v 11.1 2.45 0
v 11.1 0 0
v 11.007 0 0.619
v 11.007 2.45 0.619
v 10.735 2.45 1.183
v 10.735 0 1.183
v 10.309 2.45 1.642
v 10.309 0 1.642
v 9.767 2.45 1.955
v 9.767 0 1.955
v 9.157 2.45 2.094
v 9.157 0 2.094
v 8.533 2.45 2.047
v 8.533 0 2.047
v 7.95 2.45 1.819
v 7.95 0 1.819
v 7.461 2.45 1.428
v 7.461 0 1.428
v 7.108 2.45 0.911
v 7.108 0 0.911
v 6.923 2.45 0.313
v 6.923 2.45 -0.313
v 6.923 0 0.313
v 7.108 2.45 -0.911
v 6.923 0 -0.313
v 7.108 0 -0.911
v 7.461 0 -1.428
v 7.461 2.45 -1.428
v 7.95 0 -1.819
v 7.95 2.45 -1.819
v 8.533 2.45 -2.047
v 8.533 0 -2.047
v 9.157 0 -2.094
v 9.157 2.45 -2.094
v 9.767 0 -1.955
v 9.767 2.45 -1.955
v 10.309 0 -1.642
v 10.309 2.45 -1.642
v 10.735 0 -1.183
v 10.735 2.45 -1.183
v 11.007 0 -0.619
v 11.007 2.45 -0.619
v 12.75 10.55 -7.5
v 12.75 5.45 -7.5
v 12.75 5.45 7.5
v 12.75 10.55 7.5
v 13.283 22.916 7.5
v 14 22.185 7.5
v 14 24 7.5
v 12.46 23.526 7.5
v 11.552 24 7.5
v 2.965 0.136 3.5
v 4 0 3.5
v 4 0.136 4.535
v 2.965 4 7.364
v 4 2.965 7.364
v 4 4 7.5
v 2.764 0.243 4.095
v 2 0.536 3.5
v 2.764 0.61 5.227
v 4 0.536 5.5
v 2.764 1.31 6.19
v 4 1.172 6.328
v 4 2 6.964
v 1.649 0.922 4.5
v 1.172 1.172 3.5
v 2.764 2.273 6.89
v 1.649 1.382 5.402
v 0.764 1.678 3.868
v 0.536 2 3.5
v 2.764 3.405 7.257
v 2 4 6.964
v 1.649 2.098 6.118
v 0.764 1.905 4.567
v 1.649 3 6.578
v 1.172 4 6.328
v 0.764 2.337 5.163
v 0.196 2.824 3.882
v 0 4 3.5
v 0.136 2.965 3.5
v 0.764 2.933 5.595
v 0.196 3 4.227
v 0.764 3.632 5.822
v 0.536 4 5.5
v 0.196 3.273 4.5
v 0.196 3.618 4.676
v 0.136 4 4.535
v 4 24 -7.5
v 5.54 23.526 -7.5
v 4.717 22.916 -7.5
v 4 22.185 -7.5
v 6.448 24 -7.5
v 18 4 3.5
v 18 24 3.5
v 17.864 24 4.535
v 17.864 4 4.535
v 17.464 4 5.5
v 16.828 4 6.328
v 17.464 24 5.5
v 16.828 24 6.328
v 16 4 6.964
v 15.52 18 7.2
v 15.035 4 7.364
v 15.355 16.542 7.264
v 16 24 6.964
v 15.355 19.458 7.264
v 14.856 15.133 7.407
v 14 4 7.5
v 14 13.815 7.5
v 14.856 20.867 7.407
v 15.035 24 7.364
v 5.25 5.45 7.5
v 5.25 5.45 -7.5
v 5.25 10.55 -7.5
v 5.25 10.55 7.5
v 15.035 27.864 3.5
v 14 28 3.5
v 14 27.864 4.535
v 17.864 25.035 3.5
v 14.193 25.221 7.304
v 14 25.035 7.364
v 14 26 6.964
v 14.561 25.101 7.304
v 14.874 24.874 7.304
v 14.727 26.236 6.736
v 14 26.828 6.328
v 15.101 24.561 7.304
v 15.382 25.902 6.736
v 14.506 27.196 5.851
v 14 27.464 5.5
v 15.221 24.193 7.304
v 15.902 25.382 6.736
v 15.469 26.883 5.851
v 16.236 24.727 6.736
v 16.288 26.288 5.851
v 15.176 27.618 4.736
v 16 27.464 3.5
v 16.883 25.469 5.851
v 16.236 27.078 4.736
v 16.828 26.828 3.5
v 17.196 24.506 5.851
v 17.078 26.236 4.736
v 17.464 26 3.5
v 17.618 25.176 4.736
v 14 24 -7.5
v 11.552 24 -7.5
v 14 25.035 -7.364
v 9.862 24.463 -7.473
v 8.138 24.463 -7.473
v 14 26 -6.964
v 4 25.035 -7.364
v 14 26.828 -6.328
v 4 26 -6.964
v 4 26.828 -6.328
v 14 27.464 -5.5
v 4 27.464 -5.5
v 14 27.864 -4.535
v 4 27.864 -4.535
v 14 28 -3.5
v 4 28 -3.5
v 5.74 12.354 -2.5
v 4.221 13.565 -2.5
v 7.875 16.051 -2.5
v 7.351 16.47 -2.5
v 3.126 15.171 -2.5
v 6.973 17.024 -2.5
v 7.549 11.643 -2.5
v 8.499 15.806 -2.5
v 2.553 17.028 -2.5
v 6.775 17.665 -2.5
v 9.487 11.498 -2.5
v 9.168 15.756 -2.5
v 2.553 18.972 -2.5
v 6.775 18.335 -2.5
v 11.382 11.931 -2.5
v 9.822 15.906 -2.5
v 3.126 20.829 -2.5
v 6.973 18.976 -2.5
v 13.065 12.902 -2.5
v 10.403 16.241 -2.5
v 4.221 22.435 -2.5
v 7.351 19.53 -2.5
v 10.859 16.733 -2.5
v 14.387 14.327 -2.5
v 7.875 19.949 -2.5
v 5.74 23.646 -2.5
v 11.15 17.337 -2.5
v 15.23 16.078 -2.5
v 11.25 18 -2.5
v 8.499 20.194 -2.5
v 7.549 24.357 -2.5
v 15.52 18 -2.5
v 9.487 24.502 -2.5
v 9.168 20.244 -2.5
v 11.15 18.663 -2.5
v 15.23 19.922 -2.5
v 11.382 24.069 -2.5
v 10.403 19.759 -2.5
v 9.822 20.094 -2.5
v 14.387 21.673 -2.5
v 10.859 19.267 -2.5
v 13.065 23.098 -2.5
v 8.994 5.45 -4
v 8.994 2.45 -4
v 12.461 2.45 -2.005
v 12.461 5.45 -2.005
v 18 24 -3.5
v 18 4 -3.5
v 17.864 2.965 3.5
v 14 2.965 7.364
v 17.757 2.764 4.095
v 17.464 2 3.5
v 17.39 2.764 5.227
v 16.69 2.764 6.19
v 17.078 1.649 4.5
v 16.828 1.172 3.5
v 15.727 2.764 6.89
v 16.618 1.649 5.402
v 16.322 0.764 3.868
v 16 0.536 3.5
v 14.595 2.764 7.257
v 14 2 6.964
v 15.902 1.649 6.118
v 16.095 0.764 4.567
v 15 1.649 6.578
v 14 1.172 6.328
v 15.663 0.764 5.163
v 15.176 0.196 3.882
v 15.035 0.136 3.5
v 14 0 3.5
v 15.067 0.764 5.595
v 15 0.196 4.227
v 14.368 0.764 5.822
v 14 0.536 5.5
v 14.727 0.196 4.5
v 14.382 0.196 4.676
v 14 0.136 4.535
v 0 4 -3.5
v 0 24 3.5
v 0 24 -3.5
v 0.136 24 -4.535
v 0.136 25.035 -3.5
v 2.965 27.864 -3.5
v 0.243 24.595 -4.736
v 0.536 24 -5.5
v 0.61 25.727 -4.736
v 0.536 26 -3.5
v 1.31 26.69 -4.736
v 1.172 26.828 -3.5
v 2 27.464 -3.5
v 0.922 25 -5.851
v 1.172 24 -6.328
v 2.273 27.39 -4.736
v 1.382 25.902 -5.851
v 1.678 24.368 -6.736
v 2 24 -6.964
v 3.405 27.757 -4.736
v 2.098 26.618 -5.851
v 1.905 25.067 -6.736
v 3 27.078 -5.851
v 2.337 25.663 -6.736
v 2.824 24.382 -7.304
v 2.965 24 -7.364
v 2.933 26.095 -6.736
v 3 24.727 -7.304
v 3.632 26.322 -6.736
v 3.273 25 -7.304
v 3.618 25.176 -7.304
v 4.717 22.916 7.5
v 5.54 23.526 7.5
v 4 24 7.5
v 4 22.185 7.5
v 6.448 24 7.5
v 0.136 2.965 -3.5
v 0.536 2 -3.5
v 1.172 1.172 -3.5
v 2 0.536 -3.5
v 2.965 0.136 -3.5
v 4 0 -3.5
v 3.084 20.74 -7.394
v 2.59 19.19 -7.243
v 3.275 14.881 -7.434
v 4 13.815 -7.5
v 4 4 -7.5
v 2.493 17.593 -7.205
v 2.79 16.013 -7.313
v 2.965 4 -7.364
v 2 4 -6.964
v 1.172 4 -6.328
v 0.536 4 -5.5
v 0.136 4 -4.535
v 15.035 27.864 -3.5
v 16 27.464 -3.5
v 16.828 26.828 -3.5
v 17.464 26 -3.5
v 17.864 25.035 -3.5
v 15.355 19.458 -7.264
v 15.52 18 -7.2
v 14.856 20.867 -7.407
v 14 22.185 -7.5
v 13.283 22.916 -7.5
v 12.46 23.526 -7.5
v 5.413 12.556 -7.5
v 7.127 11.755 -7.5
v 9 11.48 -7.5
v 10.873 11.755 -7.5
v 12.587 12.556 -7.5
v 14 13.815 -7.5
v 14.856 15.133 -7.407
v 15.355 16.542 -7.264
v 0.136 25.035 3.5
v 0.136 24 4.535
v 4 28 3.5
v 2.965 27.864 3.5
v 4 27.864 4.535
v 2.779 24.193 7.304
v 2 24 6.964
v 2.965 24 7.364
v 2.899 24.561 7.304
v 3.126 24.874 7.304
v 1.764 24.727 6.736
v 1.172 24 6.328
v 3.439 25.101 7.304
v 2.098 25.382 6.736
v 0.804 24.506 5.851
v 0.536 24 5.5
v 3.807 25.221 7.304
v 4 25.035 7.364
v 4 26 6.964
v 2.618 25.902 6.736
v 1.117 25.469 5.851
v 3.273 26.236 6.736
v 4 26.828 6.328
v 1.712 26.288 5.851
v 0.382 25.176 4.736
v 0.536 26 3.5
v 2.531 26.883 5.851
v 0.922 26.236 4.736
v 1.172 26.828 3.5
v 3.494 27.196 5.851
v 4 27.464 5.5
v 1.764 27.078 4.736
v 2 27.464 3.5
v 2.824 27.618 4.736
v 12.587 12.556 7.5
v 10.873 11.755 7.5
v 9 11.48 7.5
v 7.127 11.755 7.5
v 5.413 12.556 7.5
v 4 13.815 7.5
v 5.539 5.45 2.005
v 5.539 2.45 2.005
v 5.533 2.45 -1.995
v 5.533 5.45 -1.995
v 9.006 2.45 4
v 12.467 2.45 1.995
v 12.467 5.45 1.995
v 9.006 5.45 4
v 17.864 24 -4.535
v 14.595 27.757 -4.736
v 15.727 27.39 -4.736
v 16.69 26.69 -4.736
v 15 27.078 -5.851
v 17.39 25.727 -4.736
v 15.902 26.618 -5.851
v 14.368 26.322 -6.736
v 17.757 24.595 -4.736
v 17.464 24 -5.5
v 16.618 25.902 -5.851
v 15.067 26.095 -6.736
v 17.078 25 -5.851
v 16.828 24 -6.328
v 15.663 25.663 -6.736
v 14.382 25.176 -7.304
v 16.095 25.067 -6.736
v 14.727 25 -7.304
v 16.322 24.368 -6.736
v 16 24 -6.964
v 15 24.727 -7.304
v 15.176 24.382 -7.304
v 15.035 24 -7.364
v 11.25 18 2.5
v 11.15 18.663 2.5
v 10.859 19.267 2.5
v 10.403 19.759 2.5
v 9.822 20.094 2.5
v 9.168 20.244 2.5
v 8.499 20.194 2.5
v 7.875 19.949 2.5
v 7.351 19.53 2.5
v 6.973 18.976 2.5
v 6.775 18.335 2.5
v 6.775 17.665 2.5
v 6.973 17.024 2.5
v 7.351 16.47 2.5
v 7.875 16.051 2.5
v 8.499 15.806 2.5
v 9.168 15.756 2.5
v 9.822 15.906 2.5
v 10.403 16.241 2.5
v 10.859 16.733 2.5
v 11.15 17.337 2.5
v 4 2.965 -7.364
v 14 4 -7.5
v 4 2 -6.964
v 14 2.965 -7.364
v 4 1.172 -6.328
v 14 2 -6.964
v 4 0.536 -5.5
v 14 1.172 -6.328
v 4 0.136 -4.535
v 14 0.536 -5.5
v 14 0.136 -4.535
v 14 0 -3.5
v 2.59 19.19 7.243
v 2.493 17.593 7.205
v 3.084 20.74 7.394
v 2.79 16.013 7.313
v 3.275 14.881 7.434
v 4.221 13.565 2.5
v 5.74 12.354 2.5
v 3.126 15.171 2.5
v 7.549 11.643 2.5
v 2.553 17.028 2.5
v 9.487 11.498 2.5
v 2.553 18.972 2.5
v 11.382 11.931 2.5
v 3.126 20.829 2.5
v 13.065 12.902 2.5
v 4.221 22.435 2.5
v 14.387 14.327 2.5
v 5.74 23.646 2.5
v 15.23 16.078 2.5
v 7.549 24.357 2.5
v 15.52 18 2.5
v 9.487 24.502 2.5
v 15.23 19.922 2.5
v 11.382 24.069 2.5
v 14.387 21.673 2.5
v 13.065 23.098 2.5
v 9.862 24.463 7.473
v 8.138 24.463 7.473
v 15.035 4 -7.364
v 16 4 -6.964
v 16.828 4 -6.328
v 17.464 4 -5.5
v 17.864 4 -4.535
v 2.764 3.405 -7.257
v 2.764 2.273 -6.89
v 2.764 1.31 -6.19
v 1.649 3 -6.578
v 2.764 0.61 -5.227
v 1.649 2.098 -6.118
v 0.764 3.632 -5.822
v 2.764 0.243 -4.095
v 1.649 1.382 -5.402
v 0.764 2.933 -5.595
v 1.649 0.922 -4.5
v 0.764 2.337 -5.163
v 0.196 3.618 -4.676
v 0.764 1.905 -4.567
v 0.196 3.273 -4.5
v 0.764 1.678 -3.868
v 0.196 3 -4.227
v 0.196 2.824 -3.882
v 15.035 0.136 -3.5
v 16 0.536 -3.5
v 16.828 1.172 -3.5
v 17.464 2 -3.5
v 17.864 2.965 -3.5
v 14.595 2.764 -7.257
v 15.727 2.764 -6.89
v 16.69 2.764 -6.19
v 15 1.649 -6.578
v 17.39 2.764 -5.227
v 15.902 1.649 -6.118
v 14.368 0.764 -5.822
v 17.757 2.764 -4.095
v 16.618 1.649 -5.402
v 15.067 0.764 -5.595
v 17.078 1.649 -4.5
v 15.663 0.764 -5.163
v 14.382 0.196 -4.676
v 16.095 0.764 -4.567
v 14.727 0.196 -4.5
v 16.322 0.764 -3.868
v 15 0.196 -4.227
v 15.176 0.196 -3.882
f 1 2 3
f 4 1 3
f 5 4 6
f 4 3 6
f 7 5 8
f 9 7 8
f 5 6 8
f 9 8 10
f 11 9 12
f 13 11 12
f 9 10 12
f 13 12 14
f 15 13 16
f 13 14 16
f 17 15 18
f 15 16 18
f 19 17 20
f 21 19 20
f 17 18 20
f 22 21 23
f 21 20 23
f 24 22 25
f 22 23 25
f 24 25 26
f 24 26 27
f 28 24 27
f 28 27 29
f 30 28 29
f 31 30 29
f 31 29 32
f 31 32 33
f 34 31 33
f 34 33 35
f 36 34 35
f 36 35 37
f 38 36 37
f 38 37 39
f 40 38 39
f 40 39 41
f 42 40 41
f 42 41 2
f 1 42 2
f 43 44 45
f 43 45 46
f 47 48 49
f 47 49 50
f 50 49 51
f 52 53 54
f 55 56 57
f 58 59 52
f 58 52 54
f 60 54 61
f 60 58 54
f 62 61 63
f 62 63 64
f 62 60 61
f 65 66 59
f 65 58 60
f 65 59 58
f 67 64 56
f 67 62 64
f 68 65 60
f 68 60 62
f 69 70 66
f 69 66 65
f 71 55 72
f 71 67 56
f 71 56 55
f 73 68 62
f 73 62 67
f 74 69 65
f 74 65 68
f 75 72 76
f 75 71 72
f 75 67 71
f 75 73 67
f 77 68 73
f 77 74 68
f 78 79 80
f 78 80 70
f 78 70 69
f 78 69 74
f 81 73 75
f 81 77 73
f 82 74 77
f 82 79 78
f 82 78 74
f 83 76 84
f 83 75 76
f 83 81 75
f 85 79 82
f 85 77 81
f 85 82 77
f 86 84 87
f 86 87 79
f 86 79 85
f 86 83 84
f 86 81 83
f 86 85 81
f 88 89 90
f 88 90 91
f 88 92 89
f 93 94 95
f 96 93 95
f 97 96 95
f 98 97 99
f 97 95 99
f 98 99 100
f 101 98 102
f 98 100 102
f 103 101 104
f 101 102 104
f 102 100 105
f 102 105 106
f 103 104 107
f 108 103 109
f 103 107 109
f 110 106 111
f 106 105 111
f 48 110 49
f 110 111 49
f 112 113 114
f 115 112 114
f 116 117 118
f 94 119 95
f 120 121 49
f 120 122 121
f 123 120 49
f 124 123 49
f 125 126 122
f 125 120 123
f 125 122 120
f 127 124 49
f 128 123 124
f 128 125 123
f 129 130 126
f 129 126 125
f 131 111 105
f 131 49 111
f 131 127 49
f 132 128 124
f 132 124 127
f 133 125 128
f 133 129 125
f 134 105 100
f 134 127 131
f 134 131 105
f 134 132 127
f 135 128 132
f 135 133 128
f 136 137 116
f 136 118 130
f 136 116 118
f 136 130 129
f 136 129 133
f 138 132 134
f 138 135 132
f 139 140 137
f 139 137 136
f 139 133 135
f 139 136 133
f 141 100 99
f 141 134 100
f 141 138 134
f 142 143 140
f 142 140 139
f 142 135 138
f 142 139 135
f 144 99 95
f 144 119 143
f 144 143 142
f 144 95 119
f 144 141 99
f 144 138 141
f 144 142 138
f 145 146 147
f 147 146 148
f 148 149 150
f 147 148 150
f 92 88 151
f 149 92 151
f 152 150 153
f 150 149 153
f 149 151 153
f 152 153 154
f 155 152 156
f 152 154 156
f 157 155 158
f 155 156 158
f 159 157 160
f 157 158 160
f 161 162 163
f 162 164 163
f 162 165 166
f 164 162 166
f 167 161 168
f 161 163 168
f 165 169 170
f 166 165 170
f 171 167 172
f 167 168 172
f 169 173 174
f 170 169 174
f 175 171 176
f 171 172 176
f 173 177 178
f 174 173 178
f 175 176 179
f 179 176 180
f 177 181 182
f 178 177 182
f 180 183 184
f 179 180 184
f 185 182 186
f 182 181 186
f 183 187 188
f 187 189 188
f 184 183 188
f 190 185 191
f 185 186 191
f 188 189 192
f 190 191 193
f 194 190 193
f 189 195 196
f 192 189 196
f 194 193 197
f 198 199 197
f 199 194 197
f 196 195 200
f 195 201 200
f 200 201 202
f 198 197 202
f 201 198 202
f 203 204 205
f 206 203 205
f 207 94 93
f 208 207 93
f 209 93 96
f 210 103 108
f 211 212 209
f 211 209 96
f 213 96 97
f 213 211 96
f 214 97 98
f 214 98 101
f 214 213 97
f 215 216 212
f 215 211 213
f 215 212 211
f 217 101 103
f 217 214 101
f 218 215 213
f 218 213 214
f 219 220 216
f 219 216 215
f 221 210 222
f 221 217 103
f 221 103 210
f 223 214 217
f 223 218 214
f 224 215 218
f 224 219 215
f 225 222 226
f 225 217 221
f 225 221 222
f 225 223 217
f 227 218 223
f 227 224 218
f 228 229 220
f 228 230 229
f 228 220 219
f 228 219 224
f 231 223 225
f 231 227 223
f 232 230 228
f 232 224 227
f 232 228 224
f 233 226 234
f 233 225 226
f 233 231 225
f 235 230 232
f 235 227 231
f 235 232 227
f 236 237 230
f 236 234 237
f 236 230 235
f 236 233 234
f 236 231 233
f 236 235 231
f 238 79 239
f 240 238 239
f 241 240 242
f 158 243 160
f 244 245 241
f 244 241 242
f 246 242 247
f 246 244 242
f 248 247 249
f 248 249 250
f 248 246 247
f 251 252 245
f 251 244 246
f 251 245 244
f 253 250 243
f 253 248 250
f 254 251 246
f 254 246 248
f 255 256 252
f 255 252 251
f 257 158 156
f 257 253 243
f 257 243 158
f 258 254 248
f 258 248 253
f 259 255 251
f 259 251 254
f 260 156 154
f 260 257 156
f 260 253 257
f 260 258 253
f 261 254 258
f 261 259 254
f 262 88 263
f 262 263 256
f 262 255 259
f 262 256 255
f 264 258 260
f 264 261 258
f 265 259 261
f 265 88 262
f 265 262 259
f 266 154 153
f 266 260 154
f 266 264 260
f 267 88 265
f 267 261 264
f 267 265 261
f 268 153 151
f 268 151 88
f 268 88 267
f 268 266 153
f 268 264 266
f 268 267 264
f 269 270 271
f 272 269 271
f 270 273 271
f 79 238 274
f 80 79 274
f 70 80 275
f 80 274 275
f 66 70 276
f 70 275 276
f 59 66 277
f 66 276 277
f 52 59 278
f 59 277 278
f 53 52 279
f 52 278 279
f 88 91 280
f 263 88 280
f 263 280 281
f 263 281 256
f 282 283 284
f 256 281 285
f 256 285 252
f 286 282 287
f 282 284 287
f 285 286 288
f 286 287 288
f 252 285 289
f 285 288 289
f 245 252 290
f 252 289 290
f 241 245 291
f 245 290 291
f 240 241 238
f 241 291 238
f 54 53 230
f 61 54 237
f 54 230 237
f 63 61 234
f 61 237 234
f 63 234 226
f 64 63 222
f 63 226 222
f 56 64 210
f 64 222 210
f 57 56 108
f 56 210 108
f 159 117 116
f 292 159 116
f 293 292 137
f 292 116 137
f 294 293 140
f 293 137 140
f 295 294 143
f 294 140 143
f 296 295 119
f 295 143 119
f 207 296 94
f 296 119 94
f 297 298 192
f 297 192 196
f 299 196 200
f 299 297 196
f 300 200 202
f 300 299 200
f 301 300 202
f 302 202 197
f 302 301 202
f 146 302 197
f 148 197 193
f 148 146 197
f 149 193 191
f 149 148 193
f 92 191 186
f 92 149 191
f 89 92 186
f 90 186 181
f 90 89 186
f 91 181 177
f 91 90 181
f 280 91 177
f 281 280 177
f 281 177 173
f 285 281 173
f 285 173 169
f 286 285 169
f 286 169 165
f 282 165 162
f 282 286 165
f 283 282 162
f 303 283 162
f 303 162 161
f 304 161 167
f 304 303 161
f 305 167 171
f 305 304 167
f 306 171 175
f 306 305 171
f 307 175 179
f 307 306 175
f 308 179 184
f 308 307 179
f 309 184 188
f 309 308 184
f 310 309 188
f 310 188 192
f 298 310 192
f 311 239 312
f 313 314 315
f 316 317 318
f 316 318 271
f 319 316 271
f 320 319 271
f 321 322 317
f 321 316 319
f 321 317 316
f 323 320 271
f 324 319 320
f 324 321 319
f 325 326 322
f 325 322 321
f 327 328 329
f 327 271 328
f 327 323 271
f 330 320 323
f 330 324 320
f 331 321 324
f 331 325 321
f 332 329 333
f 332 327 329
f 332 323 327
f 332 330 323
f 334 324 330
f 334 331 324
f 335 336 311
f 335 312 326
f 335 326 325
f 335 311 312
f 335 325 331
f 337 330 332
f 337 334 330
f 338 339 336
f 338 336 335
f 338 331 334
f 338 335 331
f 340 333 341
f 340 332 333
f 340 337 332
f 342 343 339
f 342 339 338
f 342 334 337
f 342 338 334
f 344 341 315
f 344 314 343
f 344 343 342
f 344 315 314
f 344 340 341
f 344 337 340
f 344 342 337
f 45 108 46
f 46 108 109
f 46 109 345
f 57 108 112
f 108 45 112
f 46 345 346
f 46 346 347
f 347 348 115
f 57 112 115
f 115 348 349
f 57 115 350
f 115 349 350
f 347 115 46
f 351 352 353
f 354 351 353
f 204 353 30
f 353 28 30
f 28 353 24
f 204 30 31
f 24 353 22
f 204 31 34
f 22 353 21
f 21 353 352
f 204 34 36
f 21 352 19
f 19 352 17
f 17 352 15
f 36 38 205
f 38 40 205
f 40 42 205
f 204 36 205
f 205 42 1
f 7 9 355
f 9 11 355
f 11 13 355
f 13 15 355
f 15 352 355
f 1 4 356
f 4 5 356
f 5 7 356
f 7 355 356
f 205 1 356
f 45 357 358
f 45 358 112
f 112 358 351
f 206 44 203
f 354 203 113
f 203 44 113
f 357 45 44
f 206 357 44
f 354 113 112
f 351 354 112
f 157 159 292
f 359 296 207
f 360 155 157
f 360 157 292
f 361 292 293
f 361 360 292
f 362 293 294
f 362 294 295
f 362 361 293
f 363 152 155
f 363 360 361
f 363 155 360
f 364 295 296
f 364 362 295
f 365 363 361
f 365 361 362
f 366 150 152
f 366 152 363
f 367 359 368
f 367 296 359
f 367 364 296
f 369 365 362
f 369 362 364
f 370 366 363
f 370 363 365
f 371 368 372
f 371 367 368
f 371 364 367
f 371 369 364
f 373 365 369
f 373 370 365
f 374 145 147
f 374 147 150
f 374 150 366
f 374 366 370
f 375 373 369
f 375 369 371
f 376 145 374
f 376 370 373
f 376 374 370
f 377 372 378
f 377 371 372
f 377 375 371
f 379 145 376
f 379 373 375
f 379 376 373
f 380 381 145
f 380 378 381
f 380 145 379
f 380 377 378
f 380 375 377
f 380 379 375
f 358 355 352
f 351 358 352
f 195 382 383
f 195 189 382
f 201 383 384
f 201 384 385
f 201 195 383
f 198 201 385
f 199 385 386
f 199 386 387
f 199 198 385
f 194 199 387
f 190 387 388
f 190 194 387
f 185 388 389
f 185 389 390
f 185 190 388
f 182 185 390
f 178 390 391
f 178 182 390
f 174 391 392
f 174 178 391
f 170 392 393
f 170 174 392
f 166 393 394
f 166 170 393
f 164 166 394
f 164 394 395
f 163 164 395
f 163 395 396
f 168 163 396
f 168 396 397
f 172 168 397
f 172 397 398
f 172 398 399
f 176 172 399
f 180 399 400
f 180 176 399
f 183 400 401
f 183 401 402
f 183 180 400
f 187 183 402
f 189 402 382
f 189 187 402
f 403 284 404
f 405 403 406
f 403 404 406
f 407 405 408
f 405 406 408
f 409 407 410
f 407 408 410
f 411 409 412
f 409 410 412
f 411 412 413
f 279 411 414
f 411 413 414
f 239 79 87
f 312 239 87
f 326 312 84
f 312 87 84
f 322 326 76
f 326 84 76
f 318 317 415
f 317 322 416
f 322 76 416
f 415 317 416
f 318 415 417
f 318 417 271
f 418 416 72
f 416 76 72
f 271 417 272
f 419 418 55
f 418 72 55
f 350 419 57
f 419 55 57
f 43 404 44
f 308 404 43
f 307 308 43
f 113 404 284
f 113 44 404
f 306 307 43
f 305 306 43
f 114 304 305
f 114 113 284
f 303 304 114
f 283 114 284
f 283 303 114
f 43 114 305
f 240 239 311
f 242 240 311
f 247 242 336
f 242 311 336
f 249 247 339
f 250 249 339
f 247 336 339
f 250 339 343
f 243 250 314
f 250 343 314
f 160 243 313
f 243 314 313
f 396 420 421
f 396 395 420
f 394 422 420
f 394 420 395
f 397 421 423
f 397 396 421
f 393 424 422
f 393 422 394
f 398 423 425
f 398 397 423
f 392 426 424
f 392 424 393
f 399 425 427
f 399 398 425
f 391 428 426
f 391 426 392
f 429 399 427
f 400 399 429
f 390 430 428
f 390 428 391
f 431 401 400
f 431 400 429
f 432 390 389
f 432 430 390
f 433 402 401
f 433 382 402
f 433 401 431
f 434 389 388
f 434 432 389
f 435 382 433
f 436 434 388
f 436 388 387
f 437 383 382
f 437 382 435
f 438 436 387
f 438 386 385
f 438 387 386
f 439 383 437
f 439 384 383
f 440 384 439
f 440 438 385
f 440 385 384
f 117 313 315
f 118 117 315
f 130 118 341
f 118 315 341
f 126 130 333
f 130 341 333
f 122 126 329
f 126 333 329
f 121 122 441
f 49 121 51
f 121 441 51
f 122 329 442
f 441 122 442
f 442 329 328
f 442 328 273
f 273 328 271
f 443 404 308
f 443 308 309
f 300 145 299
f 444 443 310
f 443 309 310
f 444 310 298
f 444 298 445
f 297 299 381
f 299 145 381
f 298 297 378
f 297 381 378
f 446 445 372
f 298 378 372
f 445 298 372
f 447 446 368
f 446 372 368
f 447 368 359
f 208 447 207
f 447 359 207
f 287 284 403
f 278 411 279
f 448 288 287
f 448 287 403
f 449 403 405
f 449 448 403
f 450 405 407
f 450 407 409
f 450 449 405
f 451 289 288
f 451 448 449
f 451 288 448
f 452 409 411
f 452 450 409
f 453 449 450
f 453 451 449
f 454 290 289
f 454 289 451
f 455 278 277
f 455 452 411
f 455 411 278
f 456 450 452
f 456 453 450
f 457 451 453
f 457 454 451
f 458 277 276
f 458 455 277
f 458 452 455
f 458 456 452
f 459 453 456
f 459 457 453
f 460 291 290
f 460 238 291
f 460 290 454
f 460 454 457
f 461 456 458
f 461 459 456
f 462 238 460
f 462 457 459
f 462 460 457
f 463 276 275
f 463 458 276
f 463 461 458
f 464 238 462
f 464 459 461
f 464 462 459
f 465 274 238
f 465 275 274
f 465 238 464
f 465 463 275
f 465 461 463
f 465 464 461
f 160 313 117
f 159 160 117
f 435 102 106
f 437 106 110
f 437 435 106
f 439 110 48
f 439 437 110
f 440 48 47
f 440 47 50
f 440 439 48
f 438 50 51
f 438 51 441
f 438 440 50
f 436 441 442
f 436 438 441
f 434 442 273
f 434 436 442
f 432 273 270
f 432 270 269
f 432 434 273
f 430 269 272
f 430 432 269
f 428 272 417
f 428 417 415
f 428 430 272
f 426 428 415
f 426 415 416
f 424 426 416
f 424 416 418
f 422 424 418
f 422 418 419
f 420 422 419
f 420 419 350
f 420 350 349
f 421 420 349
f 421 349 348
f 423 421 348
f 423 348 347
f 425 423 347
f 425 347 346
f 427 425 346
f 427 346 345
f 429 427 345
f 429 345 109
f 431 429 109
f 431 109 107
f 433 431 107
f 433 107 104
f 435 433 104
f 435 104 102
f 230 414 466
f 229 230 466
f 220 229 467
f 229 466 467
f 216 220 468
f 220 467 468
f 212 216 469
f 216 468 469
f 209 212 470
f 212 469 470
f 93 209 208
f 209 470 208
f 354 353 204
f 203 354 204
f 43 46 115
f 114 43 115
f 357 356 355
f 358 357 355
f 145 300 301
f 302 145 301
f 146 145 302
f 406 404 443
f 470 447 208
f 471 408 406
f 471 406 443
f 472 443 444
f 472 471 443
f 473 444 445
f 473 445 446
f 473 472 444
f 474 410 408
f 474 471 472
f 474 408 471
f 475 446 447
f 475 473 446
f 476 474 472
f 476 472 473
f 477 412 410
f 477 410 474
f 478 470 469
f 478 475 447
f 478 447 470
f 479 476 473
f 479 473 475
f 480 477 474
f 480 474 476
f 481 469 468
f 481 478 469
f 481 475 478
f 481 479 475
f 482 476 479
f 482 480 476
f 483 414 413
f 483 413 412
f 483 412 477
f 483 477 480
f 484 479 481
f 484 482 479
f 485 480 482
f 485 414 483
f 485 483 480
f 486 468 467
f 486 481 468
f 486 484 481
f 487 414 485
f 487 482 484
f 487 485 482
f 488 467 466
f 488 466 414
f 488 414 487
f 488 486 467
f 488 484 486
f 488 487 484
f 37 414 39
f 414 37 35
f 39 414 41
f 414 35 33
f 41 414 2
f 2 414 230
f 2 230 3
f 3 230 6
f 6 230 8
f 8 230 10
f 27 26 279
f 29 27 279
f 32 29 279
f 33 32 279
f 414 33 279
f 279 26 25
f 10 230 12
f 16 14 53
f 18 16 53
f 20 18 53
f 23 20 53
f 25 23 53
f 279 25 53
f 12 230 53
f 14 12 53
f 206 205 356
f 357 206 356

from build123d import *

# Parameters (mm, degrees)
SKETCH1_R           = 2.25
BOSS_EXTRUDE1_DEPTH = 7.5
CUT_EXTRUDE1_START  = -7.5
SKETCH1_3_R         = 6.52
SKETCH1_3_R_2       = 2.25
CUT_EXTRUDE1_DEPTH  = 5
CUT_EXTRUDE2_START  = 2.5
SKETCH1_4_R         = 6.52
SKETCH1_4_R_2       = 2.25
CUT_EXTRUDE2_DEPTH  = 5
FILLET1_R           = 4
SKETCH2_R           = 2.1
CUT_EXTRUDE3_DEPTH  = 10
SKETCH3_W           = 7.5
SKETCH3_H           = 5.1
CUT_EXTRUDE4_DEPTH  = 37.510272694
CUT_EXTRUDE5_START  = -2.45
SKETCH2_7_R         = 2.1
CUT_EXTRUDE5_DEPTH  = 3


with BuildPart() as part:
    # Sketch1 → Boss-Extrude1 (new, symmetric)
    with BuildSketch(Plane.XY):
        with BuildLine():
            Line((0, 0), (0, 24))
            ThreePointArc((0, 24), (1.171572875, 26.828427125), (4, 28))
            Line((4, 28), (14, 28))
            ThreePointArc((14, 28), (16.828427125, 26.828427125), (18, 24))
            Line((18, 24), (18, 0))
            Line((18, 0), (0, 0))
        make_face()
        with Locations((9, 18)):
            Circle(SKETCH1_R, mode=Mode.SUBTRACT)
    extrude(amount=BOSS_EXTRUDE1_DEPTH, both=True)

    # Sketch1<3> → Cut-Extrude1 (cut)
    with BuildSketch(Plane.XY.offset(CUT_EXTRUDE1_START)):
        with Locations((9, 18)):
            Circle(SKETCH1_3_R)
        with Locations((9, 18)):
            Circle(SKETCH1_3_R_2, mode=Mode.SUBTRACT)
    extrude(amount=CUT_EXTRUDE1_DEPTH, mode=Mode.SUBTRACT)

    # Sketch1<4> → Cut-Extrude2 (cut)
    with BuildSketch(Plane.XY.offset(CUT_EXTRUDE2_START)):
        with Locations((9, 18)):
            Circle(SKETCH1_4_R)
        with Locations((9, 18)):
            Circle(SKETCH1_4_R_2, mode=Mode.SUBTRACT)
    extrude(amount=CUT_EXTRUDE2_DEPTH, mode=Mode.SUBTRACT)

    # Fillet1
    # the kernel refuses this fillet: 4 mm, written as the material it takes off along each edge
    with BuildSketch(Plane(origin=(4, 4, -3.5), x_dir=(0, -1, 0), z_dir=(-1, 0, 0))) as fillet1_piece_1_section:
        Polygon((0, 0), (FILLET1_R, 0), (FILLET1_R, -FILLET1_R), (0, -FILLET1_R), align=None)
    fillet1_piece_1 = extrude(amount=FILLET1_R, mode=Mode.PRIVATE)
    fillet1_piece_1 = fillet1_piece_1 - Plane(origin=(4, 4, -3.5), x_dir=(0, 0.7071067811865475, 0.7071067811865475), z_dir=(-1, 0, 0)) * Sphere(FILLET1_R, mode=Mode.PRIVATE)
    add(fillet1_piece_1, mode=Mode.SUBTRACT)
    with BuildSketch(Plane(origin=(4, 4, 3.5), x_dir=(0, -1, 0), z_dir=(-1, 0, 0))) as fillet1_piece_2_section:
        Polygon((0, 0), (FILLET1_R, 0), (FILLET1_R, FILLET1_R), (0, FILLET1_R), align=None)
    fillet1_piece_2 = extrude(amount=FILLET1_R, mode=Mode.PRIVATE)
    fillet1_piece_2 = fillet1_piece_2 - Plane(origin=(4, 4, 3.5), x_dir=(0, 0.7071067811865475, -0.7071067811865475), z_dir=(-1, 0, 0)) * Sphere(FILLET1_R, mode=Mode.PRIVATE)
    add(fillet1_piece_2, mode=Mode.SUBTRACT)
    with BuildSketch(Plane(origin=(14, 4, -3.5), x_dir=(0, 0, -1), z_dir=(0, -1, 0))) as fillet1_piece_3_section:
        Polygon((0, 0), (FILLET1_R, 0), (FILLET1_R, FILLET1_R), (0, FILLET1_R), align=None)
    fillet1_piece_3 = extrude(amount=FILLET1_R, mode=Mode.PRIVATE)
    fillet1_piece_3 = fillet1_piece_3 - Plane(origin=(14, 4, -3.5), x_dir=(-0.7071067811865475, 0, 0.7071067811865475), z_dir=(0, -1, 0)) * Sphere(FILLET1_R, mode=Mode.PRIVATE)
    add(fillet1_piece_3, mode=Mode.SUBTRACT)
    with BuildSketch(Plane(origin=(14, 4, 3.5), x_dir=(0, 0, 1), z_dir=(0, -1, 0))) as fillet1_piece_4_section:
        Polygon((0, 0), (FILLET1_R, 0), (FILLET1_R, -FILLET1_R), (0, -FILLET1_R), align=None)
    fillet1_piece_4 = extrude(amount=FILLET1_R, mode=Mode.PRIVATE)
    fillet1_piece_4 = fillet1_piece_4 - Plane(origin=(14, 4, 3.5), x_dir=(-0.7071067811865475, 0, -0.7071067811865475), z_dir=(0, -1, 0)) * Sphere(FILLET1_R, mode=Mode.PRIVATE)
    add(fillet1_piece_4, mode=Mode.SUBTRACT)
    with BuildSketch(Plane(origin=(0, 4, -7.5), x_dir=(0, 0, 1), z_dir=(0, 1, 0)), Plane(origin=(18, 24, 7.5), x_dir=(-1, 0, 0), z_dir=(0, -1, 0))) as fillet1_piece_5:
        with BuildLine():
            CenterArc((FILLET1_R, FILLET1_R), FILLET1_R, 180, 90)
            Line((0, FILLET1_R), (0, 0))
            Line((0, 0), (FILLET1_R, 0))
        make_face()
    extrude(amount=20, mode=Mode.SUBTRACT)
    with BuildSketch(Plane(origin=(4, 24, -7.5), x_dir=(-1, 0, 0), z_dir=(0, -1, 0))) as fillet1_piece_6:
        with BuildLine():
            CenterArc((4 - FILLET1_R, -FILLET1_R), FILLET1_R, 0, 90)
            Line((4, -FILLET1_R), (4, 0))
            Line((4, 0), (4 - FILLET1_R, 0))
        make_face()
    revolve(axis=Axis((4, 24, -7.5), (0, 0, -1)), revolution_arc=90, mode=Mode.SUBTRACT)
    with BuildSketch(Plane(origin=(0, 4, 7.5), x_dir=(0, 0, -1), z_dir=(0, 1, 0)), Plane(origin=(18, 24, -7.5), x_dir=(-1, 0, 0), z_dir=(0, -1, 0))) as fillet1_piece_7:
        with BuildLine():
            CenterArc((FILLET1_R, -FILLET1_R), FILLET1_R, 90, 90)
            Line((0, -FILLET1_R), (0, 0))
            Line((0, 0), (FILLET1_R, 0))
        make_face()
    extrude(amount=20, mode=Mode.SUBTRACT)
    with BuildSketch(Plane(origin=(18, 0, -3.5), x_dir=(-1, 0, 0), z_dir=(0, 0, 1)), Plane(origin=(0, 0, -3.5), x_dir=(0, 1, 0), z_dir=(0, 0, 1))) as fillet1_piece_8:
        with BuildLine():
            CenterArc((FILLET1_R, -FILLET1_R), FILLET1_R, 90, 90)
            Line((0, -FILLET1_R), (0, 0))
            Line((0, 0), (FILLET1_R, 0))
        make_face()
    extrude(amount=7, mode=Mode.SUBTRACT)
    with BuildSketch(Plane(origin=(14, 0, 7.5), x_dir=(0, 0, -1), z_dir=(-1, 0, 0)), Plane(origin=(4, 28, -7.5), x_dir=(0, -1, 0), z_dir=(1, 0, 0))) as fillet1_piece_9:
        with BuildLine():
            CenterArc((FILLET1_R, -FILLET1_R), FILLET1_R, 90, 90)
            Line((0, -FILLET1_R), (0, 0))
            Line((0, 0), (FILLET1_R, 0))
        make_face()
    extrude(amount=10, mode=Mode.SUBTRACT)
    with BuildSketch(Plane(origin=(14, 24, 7.5), x_dir=(0, 1, 0), z_dir=(-1, 0, 0))) as fillet1_piece_10:
        with BuildLine():
            CenterArc((4 - FILLET1_R, FILLET1_R), FILLET1_R, 270, 90)
            Line((4, FILLET1_R), (4, 0))
            Line((4, 0), (4 - FILLET1_R, 0))
        make_face()
    revolve(axis=Axis((14, 24, 7.5), (0, 0, -1)), revolution_arc=90, mode=Mode.SUBTRACT)
    with BuildSketch(Plane(origin=(4, 28, 7.5), x_dir=(0, -1, 0), z_dir=(1, 0, 0)), Plane(origin=(14, 0, -7.5), x_dir=(0, 0, 1), z_dir=(-1, 0, 0))) as fillet1_piece_11:
        with BuildLine():
            CenterArc((FILLET1_R, FILLET1_R), FILLET1_R, 180, 90)
            Line((0, FILLET1_R), (0, 0))
            Line((0, 0), (FILLET1_R, 0))
        make_face()
    extrude(amount=10, mode=Mode.SUBTRACT)
    with BuildSketch(Plane(origin=(14, 24, -7.5), x_dir=(0, 1, 0), z_dir=(-1, 0, 0))) as fillet1_piece_12:
        with BuildLine():
            CenterArc((4 - FILLET1_R, -FILLET1_R), FILLET1_R, 0, 90)
            Line((4, -FILLET1_R), (4, 0))
            Line((4, 0), (4 - FILLET1_R, 0))
        make_face()
    revolve(axis=Axis((14, 24, -7.5), (0, 0, -1)), revolution_arc=90, mode=Mode.SUBTRACT)
    with BuildSketch(Plane(origin=(4, 24, 7.5), x_dir=(-1, 0, 0), z_dir=(0, -1, 0))) as fillet1_piece_13:
        with BuildLine():
            CenterArc((4 - FILLET1_R, FILLET1_R), FILLET1_R, 270, 90)
            Line((4 - FILLET1_R, 0), (4, 0))
            Line((4, 0), (4, FILLET1_R))
        make_face()
    revolve(axis=Axis((4, 24, 7.5), (0, 0, -1)), revolution_arc=90, mode=Mode.SUBTRACT)

    # Sketch2 → Cut-Extrude3 (cut)
    with BuildSketch(Plane.XZ):
        with Locations((9, 0)):
            Circle(SKETCH2_R)
    extrude(amount=-CUT_EXTRUDE3_DEPTH, mode=Mode.SUBTRACT)

    # Sketch3 → Cut-Extrude4 (cut, through all)
    with BuildSketch(Plane(origin=(0, 0, -7.5), x_dir=(-1, 0, 0), z_dir=(0, 0, -1))):
        with Locations((-9, 8)):
            Rectangle(SKETCH3_W, SKETCH3_H)
    extrude(amount=-CUT_EXTRUDE4_DEPTH, mode=Mode.SUBTRACT)

    # Sketch2<7> → Cut-Extrude5 (cut)
    with BuildSketch(Plane.XZ.offset(CUT_EXTRUDE5_START)):
        Polygon((12.461165772, -2.005076432), (12.467030013, 1.994919269), (9.005864241, 3.999995701), (5.538834228, 2.005076432), (5.532969987, -1.994919269), (8.994135759, -3.999995701), align=None)
        with Locations((9, 0)):
            Circle(SKETCH2_7_R, mode=Mode.SUBTRACT)
    extrude(amount=-CUT_EXTRUDE5_DEPTH, mode=Mode.SUBTRACT)


solid = part.part
